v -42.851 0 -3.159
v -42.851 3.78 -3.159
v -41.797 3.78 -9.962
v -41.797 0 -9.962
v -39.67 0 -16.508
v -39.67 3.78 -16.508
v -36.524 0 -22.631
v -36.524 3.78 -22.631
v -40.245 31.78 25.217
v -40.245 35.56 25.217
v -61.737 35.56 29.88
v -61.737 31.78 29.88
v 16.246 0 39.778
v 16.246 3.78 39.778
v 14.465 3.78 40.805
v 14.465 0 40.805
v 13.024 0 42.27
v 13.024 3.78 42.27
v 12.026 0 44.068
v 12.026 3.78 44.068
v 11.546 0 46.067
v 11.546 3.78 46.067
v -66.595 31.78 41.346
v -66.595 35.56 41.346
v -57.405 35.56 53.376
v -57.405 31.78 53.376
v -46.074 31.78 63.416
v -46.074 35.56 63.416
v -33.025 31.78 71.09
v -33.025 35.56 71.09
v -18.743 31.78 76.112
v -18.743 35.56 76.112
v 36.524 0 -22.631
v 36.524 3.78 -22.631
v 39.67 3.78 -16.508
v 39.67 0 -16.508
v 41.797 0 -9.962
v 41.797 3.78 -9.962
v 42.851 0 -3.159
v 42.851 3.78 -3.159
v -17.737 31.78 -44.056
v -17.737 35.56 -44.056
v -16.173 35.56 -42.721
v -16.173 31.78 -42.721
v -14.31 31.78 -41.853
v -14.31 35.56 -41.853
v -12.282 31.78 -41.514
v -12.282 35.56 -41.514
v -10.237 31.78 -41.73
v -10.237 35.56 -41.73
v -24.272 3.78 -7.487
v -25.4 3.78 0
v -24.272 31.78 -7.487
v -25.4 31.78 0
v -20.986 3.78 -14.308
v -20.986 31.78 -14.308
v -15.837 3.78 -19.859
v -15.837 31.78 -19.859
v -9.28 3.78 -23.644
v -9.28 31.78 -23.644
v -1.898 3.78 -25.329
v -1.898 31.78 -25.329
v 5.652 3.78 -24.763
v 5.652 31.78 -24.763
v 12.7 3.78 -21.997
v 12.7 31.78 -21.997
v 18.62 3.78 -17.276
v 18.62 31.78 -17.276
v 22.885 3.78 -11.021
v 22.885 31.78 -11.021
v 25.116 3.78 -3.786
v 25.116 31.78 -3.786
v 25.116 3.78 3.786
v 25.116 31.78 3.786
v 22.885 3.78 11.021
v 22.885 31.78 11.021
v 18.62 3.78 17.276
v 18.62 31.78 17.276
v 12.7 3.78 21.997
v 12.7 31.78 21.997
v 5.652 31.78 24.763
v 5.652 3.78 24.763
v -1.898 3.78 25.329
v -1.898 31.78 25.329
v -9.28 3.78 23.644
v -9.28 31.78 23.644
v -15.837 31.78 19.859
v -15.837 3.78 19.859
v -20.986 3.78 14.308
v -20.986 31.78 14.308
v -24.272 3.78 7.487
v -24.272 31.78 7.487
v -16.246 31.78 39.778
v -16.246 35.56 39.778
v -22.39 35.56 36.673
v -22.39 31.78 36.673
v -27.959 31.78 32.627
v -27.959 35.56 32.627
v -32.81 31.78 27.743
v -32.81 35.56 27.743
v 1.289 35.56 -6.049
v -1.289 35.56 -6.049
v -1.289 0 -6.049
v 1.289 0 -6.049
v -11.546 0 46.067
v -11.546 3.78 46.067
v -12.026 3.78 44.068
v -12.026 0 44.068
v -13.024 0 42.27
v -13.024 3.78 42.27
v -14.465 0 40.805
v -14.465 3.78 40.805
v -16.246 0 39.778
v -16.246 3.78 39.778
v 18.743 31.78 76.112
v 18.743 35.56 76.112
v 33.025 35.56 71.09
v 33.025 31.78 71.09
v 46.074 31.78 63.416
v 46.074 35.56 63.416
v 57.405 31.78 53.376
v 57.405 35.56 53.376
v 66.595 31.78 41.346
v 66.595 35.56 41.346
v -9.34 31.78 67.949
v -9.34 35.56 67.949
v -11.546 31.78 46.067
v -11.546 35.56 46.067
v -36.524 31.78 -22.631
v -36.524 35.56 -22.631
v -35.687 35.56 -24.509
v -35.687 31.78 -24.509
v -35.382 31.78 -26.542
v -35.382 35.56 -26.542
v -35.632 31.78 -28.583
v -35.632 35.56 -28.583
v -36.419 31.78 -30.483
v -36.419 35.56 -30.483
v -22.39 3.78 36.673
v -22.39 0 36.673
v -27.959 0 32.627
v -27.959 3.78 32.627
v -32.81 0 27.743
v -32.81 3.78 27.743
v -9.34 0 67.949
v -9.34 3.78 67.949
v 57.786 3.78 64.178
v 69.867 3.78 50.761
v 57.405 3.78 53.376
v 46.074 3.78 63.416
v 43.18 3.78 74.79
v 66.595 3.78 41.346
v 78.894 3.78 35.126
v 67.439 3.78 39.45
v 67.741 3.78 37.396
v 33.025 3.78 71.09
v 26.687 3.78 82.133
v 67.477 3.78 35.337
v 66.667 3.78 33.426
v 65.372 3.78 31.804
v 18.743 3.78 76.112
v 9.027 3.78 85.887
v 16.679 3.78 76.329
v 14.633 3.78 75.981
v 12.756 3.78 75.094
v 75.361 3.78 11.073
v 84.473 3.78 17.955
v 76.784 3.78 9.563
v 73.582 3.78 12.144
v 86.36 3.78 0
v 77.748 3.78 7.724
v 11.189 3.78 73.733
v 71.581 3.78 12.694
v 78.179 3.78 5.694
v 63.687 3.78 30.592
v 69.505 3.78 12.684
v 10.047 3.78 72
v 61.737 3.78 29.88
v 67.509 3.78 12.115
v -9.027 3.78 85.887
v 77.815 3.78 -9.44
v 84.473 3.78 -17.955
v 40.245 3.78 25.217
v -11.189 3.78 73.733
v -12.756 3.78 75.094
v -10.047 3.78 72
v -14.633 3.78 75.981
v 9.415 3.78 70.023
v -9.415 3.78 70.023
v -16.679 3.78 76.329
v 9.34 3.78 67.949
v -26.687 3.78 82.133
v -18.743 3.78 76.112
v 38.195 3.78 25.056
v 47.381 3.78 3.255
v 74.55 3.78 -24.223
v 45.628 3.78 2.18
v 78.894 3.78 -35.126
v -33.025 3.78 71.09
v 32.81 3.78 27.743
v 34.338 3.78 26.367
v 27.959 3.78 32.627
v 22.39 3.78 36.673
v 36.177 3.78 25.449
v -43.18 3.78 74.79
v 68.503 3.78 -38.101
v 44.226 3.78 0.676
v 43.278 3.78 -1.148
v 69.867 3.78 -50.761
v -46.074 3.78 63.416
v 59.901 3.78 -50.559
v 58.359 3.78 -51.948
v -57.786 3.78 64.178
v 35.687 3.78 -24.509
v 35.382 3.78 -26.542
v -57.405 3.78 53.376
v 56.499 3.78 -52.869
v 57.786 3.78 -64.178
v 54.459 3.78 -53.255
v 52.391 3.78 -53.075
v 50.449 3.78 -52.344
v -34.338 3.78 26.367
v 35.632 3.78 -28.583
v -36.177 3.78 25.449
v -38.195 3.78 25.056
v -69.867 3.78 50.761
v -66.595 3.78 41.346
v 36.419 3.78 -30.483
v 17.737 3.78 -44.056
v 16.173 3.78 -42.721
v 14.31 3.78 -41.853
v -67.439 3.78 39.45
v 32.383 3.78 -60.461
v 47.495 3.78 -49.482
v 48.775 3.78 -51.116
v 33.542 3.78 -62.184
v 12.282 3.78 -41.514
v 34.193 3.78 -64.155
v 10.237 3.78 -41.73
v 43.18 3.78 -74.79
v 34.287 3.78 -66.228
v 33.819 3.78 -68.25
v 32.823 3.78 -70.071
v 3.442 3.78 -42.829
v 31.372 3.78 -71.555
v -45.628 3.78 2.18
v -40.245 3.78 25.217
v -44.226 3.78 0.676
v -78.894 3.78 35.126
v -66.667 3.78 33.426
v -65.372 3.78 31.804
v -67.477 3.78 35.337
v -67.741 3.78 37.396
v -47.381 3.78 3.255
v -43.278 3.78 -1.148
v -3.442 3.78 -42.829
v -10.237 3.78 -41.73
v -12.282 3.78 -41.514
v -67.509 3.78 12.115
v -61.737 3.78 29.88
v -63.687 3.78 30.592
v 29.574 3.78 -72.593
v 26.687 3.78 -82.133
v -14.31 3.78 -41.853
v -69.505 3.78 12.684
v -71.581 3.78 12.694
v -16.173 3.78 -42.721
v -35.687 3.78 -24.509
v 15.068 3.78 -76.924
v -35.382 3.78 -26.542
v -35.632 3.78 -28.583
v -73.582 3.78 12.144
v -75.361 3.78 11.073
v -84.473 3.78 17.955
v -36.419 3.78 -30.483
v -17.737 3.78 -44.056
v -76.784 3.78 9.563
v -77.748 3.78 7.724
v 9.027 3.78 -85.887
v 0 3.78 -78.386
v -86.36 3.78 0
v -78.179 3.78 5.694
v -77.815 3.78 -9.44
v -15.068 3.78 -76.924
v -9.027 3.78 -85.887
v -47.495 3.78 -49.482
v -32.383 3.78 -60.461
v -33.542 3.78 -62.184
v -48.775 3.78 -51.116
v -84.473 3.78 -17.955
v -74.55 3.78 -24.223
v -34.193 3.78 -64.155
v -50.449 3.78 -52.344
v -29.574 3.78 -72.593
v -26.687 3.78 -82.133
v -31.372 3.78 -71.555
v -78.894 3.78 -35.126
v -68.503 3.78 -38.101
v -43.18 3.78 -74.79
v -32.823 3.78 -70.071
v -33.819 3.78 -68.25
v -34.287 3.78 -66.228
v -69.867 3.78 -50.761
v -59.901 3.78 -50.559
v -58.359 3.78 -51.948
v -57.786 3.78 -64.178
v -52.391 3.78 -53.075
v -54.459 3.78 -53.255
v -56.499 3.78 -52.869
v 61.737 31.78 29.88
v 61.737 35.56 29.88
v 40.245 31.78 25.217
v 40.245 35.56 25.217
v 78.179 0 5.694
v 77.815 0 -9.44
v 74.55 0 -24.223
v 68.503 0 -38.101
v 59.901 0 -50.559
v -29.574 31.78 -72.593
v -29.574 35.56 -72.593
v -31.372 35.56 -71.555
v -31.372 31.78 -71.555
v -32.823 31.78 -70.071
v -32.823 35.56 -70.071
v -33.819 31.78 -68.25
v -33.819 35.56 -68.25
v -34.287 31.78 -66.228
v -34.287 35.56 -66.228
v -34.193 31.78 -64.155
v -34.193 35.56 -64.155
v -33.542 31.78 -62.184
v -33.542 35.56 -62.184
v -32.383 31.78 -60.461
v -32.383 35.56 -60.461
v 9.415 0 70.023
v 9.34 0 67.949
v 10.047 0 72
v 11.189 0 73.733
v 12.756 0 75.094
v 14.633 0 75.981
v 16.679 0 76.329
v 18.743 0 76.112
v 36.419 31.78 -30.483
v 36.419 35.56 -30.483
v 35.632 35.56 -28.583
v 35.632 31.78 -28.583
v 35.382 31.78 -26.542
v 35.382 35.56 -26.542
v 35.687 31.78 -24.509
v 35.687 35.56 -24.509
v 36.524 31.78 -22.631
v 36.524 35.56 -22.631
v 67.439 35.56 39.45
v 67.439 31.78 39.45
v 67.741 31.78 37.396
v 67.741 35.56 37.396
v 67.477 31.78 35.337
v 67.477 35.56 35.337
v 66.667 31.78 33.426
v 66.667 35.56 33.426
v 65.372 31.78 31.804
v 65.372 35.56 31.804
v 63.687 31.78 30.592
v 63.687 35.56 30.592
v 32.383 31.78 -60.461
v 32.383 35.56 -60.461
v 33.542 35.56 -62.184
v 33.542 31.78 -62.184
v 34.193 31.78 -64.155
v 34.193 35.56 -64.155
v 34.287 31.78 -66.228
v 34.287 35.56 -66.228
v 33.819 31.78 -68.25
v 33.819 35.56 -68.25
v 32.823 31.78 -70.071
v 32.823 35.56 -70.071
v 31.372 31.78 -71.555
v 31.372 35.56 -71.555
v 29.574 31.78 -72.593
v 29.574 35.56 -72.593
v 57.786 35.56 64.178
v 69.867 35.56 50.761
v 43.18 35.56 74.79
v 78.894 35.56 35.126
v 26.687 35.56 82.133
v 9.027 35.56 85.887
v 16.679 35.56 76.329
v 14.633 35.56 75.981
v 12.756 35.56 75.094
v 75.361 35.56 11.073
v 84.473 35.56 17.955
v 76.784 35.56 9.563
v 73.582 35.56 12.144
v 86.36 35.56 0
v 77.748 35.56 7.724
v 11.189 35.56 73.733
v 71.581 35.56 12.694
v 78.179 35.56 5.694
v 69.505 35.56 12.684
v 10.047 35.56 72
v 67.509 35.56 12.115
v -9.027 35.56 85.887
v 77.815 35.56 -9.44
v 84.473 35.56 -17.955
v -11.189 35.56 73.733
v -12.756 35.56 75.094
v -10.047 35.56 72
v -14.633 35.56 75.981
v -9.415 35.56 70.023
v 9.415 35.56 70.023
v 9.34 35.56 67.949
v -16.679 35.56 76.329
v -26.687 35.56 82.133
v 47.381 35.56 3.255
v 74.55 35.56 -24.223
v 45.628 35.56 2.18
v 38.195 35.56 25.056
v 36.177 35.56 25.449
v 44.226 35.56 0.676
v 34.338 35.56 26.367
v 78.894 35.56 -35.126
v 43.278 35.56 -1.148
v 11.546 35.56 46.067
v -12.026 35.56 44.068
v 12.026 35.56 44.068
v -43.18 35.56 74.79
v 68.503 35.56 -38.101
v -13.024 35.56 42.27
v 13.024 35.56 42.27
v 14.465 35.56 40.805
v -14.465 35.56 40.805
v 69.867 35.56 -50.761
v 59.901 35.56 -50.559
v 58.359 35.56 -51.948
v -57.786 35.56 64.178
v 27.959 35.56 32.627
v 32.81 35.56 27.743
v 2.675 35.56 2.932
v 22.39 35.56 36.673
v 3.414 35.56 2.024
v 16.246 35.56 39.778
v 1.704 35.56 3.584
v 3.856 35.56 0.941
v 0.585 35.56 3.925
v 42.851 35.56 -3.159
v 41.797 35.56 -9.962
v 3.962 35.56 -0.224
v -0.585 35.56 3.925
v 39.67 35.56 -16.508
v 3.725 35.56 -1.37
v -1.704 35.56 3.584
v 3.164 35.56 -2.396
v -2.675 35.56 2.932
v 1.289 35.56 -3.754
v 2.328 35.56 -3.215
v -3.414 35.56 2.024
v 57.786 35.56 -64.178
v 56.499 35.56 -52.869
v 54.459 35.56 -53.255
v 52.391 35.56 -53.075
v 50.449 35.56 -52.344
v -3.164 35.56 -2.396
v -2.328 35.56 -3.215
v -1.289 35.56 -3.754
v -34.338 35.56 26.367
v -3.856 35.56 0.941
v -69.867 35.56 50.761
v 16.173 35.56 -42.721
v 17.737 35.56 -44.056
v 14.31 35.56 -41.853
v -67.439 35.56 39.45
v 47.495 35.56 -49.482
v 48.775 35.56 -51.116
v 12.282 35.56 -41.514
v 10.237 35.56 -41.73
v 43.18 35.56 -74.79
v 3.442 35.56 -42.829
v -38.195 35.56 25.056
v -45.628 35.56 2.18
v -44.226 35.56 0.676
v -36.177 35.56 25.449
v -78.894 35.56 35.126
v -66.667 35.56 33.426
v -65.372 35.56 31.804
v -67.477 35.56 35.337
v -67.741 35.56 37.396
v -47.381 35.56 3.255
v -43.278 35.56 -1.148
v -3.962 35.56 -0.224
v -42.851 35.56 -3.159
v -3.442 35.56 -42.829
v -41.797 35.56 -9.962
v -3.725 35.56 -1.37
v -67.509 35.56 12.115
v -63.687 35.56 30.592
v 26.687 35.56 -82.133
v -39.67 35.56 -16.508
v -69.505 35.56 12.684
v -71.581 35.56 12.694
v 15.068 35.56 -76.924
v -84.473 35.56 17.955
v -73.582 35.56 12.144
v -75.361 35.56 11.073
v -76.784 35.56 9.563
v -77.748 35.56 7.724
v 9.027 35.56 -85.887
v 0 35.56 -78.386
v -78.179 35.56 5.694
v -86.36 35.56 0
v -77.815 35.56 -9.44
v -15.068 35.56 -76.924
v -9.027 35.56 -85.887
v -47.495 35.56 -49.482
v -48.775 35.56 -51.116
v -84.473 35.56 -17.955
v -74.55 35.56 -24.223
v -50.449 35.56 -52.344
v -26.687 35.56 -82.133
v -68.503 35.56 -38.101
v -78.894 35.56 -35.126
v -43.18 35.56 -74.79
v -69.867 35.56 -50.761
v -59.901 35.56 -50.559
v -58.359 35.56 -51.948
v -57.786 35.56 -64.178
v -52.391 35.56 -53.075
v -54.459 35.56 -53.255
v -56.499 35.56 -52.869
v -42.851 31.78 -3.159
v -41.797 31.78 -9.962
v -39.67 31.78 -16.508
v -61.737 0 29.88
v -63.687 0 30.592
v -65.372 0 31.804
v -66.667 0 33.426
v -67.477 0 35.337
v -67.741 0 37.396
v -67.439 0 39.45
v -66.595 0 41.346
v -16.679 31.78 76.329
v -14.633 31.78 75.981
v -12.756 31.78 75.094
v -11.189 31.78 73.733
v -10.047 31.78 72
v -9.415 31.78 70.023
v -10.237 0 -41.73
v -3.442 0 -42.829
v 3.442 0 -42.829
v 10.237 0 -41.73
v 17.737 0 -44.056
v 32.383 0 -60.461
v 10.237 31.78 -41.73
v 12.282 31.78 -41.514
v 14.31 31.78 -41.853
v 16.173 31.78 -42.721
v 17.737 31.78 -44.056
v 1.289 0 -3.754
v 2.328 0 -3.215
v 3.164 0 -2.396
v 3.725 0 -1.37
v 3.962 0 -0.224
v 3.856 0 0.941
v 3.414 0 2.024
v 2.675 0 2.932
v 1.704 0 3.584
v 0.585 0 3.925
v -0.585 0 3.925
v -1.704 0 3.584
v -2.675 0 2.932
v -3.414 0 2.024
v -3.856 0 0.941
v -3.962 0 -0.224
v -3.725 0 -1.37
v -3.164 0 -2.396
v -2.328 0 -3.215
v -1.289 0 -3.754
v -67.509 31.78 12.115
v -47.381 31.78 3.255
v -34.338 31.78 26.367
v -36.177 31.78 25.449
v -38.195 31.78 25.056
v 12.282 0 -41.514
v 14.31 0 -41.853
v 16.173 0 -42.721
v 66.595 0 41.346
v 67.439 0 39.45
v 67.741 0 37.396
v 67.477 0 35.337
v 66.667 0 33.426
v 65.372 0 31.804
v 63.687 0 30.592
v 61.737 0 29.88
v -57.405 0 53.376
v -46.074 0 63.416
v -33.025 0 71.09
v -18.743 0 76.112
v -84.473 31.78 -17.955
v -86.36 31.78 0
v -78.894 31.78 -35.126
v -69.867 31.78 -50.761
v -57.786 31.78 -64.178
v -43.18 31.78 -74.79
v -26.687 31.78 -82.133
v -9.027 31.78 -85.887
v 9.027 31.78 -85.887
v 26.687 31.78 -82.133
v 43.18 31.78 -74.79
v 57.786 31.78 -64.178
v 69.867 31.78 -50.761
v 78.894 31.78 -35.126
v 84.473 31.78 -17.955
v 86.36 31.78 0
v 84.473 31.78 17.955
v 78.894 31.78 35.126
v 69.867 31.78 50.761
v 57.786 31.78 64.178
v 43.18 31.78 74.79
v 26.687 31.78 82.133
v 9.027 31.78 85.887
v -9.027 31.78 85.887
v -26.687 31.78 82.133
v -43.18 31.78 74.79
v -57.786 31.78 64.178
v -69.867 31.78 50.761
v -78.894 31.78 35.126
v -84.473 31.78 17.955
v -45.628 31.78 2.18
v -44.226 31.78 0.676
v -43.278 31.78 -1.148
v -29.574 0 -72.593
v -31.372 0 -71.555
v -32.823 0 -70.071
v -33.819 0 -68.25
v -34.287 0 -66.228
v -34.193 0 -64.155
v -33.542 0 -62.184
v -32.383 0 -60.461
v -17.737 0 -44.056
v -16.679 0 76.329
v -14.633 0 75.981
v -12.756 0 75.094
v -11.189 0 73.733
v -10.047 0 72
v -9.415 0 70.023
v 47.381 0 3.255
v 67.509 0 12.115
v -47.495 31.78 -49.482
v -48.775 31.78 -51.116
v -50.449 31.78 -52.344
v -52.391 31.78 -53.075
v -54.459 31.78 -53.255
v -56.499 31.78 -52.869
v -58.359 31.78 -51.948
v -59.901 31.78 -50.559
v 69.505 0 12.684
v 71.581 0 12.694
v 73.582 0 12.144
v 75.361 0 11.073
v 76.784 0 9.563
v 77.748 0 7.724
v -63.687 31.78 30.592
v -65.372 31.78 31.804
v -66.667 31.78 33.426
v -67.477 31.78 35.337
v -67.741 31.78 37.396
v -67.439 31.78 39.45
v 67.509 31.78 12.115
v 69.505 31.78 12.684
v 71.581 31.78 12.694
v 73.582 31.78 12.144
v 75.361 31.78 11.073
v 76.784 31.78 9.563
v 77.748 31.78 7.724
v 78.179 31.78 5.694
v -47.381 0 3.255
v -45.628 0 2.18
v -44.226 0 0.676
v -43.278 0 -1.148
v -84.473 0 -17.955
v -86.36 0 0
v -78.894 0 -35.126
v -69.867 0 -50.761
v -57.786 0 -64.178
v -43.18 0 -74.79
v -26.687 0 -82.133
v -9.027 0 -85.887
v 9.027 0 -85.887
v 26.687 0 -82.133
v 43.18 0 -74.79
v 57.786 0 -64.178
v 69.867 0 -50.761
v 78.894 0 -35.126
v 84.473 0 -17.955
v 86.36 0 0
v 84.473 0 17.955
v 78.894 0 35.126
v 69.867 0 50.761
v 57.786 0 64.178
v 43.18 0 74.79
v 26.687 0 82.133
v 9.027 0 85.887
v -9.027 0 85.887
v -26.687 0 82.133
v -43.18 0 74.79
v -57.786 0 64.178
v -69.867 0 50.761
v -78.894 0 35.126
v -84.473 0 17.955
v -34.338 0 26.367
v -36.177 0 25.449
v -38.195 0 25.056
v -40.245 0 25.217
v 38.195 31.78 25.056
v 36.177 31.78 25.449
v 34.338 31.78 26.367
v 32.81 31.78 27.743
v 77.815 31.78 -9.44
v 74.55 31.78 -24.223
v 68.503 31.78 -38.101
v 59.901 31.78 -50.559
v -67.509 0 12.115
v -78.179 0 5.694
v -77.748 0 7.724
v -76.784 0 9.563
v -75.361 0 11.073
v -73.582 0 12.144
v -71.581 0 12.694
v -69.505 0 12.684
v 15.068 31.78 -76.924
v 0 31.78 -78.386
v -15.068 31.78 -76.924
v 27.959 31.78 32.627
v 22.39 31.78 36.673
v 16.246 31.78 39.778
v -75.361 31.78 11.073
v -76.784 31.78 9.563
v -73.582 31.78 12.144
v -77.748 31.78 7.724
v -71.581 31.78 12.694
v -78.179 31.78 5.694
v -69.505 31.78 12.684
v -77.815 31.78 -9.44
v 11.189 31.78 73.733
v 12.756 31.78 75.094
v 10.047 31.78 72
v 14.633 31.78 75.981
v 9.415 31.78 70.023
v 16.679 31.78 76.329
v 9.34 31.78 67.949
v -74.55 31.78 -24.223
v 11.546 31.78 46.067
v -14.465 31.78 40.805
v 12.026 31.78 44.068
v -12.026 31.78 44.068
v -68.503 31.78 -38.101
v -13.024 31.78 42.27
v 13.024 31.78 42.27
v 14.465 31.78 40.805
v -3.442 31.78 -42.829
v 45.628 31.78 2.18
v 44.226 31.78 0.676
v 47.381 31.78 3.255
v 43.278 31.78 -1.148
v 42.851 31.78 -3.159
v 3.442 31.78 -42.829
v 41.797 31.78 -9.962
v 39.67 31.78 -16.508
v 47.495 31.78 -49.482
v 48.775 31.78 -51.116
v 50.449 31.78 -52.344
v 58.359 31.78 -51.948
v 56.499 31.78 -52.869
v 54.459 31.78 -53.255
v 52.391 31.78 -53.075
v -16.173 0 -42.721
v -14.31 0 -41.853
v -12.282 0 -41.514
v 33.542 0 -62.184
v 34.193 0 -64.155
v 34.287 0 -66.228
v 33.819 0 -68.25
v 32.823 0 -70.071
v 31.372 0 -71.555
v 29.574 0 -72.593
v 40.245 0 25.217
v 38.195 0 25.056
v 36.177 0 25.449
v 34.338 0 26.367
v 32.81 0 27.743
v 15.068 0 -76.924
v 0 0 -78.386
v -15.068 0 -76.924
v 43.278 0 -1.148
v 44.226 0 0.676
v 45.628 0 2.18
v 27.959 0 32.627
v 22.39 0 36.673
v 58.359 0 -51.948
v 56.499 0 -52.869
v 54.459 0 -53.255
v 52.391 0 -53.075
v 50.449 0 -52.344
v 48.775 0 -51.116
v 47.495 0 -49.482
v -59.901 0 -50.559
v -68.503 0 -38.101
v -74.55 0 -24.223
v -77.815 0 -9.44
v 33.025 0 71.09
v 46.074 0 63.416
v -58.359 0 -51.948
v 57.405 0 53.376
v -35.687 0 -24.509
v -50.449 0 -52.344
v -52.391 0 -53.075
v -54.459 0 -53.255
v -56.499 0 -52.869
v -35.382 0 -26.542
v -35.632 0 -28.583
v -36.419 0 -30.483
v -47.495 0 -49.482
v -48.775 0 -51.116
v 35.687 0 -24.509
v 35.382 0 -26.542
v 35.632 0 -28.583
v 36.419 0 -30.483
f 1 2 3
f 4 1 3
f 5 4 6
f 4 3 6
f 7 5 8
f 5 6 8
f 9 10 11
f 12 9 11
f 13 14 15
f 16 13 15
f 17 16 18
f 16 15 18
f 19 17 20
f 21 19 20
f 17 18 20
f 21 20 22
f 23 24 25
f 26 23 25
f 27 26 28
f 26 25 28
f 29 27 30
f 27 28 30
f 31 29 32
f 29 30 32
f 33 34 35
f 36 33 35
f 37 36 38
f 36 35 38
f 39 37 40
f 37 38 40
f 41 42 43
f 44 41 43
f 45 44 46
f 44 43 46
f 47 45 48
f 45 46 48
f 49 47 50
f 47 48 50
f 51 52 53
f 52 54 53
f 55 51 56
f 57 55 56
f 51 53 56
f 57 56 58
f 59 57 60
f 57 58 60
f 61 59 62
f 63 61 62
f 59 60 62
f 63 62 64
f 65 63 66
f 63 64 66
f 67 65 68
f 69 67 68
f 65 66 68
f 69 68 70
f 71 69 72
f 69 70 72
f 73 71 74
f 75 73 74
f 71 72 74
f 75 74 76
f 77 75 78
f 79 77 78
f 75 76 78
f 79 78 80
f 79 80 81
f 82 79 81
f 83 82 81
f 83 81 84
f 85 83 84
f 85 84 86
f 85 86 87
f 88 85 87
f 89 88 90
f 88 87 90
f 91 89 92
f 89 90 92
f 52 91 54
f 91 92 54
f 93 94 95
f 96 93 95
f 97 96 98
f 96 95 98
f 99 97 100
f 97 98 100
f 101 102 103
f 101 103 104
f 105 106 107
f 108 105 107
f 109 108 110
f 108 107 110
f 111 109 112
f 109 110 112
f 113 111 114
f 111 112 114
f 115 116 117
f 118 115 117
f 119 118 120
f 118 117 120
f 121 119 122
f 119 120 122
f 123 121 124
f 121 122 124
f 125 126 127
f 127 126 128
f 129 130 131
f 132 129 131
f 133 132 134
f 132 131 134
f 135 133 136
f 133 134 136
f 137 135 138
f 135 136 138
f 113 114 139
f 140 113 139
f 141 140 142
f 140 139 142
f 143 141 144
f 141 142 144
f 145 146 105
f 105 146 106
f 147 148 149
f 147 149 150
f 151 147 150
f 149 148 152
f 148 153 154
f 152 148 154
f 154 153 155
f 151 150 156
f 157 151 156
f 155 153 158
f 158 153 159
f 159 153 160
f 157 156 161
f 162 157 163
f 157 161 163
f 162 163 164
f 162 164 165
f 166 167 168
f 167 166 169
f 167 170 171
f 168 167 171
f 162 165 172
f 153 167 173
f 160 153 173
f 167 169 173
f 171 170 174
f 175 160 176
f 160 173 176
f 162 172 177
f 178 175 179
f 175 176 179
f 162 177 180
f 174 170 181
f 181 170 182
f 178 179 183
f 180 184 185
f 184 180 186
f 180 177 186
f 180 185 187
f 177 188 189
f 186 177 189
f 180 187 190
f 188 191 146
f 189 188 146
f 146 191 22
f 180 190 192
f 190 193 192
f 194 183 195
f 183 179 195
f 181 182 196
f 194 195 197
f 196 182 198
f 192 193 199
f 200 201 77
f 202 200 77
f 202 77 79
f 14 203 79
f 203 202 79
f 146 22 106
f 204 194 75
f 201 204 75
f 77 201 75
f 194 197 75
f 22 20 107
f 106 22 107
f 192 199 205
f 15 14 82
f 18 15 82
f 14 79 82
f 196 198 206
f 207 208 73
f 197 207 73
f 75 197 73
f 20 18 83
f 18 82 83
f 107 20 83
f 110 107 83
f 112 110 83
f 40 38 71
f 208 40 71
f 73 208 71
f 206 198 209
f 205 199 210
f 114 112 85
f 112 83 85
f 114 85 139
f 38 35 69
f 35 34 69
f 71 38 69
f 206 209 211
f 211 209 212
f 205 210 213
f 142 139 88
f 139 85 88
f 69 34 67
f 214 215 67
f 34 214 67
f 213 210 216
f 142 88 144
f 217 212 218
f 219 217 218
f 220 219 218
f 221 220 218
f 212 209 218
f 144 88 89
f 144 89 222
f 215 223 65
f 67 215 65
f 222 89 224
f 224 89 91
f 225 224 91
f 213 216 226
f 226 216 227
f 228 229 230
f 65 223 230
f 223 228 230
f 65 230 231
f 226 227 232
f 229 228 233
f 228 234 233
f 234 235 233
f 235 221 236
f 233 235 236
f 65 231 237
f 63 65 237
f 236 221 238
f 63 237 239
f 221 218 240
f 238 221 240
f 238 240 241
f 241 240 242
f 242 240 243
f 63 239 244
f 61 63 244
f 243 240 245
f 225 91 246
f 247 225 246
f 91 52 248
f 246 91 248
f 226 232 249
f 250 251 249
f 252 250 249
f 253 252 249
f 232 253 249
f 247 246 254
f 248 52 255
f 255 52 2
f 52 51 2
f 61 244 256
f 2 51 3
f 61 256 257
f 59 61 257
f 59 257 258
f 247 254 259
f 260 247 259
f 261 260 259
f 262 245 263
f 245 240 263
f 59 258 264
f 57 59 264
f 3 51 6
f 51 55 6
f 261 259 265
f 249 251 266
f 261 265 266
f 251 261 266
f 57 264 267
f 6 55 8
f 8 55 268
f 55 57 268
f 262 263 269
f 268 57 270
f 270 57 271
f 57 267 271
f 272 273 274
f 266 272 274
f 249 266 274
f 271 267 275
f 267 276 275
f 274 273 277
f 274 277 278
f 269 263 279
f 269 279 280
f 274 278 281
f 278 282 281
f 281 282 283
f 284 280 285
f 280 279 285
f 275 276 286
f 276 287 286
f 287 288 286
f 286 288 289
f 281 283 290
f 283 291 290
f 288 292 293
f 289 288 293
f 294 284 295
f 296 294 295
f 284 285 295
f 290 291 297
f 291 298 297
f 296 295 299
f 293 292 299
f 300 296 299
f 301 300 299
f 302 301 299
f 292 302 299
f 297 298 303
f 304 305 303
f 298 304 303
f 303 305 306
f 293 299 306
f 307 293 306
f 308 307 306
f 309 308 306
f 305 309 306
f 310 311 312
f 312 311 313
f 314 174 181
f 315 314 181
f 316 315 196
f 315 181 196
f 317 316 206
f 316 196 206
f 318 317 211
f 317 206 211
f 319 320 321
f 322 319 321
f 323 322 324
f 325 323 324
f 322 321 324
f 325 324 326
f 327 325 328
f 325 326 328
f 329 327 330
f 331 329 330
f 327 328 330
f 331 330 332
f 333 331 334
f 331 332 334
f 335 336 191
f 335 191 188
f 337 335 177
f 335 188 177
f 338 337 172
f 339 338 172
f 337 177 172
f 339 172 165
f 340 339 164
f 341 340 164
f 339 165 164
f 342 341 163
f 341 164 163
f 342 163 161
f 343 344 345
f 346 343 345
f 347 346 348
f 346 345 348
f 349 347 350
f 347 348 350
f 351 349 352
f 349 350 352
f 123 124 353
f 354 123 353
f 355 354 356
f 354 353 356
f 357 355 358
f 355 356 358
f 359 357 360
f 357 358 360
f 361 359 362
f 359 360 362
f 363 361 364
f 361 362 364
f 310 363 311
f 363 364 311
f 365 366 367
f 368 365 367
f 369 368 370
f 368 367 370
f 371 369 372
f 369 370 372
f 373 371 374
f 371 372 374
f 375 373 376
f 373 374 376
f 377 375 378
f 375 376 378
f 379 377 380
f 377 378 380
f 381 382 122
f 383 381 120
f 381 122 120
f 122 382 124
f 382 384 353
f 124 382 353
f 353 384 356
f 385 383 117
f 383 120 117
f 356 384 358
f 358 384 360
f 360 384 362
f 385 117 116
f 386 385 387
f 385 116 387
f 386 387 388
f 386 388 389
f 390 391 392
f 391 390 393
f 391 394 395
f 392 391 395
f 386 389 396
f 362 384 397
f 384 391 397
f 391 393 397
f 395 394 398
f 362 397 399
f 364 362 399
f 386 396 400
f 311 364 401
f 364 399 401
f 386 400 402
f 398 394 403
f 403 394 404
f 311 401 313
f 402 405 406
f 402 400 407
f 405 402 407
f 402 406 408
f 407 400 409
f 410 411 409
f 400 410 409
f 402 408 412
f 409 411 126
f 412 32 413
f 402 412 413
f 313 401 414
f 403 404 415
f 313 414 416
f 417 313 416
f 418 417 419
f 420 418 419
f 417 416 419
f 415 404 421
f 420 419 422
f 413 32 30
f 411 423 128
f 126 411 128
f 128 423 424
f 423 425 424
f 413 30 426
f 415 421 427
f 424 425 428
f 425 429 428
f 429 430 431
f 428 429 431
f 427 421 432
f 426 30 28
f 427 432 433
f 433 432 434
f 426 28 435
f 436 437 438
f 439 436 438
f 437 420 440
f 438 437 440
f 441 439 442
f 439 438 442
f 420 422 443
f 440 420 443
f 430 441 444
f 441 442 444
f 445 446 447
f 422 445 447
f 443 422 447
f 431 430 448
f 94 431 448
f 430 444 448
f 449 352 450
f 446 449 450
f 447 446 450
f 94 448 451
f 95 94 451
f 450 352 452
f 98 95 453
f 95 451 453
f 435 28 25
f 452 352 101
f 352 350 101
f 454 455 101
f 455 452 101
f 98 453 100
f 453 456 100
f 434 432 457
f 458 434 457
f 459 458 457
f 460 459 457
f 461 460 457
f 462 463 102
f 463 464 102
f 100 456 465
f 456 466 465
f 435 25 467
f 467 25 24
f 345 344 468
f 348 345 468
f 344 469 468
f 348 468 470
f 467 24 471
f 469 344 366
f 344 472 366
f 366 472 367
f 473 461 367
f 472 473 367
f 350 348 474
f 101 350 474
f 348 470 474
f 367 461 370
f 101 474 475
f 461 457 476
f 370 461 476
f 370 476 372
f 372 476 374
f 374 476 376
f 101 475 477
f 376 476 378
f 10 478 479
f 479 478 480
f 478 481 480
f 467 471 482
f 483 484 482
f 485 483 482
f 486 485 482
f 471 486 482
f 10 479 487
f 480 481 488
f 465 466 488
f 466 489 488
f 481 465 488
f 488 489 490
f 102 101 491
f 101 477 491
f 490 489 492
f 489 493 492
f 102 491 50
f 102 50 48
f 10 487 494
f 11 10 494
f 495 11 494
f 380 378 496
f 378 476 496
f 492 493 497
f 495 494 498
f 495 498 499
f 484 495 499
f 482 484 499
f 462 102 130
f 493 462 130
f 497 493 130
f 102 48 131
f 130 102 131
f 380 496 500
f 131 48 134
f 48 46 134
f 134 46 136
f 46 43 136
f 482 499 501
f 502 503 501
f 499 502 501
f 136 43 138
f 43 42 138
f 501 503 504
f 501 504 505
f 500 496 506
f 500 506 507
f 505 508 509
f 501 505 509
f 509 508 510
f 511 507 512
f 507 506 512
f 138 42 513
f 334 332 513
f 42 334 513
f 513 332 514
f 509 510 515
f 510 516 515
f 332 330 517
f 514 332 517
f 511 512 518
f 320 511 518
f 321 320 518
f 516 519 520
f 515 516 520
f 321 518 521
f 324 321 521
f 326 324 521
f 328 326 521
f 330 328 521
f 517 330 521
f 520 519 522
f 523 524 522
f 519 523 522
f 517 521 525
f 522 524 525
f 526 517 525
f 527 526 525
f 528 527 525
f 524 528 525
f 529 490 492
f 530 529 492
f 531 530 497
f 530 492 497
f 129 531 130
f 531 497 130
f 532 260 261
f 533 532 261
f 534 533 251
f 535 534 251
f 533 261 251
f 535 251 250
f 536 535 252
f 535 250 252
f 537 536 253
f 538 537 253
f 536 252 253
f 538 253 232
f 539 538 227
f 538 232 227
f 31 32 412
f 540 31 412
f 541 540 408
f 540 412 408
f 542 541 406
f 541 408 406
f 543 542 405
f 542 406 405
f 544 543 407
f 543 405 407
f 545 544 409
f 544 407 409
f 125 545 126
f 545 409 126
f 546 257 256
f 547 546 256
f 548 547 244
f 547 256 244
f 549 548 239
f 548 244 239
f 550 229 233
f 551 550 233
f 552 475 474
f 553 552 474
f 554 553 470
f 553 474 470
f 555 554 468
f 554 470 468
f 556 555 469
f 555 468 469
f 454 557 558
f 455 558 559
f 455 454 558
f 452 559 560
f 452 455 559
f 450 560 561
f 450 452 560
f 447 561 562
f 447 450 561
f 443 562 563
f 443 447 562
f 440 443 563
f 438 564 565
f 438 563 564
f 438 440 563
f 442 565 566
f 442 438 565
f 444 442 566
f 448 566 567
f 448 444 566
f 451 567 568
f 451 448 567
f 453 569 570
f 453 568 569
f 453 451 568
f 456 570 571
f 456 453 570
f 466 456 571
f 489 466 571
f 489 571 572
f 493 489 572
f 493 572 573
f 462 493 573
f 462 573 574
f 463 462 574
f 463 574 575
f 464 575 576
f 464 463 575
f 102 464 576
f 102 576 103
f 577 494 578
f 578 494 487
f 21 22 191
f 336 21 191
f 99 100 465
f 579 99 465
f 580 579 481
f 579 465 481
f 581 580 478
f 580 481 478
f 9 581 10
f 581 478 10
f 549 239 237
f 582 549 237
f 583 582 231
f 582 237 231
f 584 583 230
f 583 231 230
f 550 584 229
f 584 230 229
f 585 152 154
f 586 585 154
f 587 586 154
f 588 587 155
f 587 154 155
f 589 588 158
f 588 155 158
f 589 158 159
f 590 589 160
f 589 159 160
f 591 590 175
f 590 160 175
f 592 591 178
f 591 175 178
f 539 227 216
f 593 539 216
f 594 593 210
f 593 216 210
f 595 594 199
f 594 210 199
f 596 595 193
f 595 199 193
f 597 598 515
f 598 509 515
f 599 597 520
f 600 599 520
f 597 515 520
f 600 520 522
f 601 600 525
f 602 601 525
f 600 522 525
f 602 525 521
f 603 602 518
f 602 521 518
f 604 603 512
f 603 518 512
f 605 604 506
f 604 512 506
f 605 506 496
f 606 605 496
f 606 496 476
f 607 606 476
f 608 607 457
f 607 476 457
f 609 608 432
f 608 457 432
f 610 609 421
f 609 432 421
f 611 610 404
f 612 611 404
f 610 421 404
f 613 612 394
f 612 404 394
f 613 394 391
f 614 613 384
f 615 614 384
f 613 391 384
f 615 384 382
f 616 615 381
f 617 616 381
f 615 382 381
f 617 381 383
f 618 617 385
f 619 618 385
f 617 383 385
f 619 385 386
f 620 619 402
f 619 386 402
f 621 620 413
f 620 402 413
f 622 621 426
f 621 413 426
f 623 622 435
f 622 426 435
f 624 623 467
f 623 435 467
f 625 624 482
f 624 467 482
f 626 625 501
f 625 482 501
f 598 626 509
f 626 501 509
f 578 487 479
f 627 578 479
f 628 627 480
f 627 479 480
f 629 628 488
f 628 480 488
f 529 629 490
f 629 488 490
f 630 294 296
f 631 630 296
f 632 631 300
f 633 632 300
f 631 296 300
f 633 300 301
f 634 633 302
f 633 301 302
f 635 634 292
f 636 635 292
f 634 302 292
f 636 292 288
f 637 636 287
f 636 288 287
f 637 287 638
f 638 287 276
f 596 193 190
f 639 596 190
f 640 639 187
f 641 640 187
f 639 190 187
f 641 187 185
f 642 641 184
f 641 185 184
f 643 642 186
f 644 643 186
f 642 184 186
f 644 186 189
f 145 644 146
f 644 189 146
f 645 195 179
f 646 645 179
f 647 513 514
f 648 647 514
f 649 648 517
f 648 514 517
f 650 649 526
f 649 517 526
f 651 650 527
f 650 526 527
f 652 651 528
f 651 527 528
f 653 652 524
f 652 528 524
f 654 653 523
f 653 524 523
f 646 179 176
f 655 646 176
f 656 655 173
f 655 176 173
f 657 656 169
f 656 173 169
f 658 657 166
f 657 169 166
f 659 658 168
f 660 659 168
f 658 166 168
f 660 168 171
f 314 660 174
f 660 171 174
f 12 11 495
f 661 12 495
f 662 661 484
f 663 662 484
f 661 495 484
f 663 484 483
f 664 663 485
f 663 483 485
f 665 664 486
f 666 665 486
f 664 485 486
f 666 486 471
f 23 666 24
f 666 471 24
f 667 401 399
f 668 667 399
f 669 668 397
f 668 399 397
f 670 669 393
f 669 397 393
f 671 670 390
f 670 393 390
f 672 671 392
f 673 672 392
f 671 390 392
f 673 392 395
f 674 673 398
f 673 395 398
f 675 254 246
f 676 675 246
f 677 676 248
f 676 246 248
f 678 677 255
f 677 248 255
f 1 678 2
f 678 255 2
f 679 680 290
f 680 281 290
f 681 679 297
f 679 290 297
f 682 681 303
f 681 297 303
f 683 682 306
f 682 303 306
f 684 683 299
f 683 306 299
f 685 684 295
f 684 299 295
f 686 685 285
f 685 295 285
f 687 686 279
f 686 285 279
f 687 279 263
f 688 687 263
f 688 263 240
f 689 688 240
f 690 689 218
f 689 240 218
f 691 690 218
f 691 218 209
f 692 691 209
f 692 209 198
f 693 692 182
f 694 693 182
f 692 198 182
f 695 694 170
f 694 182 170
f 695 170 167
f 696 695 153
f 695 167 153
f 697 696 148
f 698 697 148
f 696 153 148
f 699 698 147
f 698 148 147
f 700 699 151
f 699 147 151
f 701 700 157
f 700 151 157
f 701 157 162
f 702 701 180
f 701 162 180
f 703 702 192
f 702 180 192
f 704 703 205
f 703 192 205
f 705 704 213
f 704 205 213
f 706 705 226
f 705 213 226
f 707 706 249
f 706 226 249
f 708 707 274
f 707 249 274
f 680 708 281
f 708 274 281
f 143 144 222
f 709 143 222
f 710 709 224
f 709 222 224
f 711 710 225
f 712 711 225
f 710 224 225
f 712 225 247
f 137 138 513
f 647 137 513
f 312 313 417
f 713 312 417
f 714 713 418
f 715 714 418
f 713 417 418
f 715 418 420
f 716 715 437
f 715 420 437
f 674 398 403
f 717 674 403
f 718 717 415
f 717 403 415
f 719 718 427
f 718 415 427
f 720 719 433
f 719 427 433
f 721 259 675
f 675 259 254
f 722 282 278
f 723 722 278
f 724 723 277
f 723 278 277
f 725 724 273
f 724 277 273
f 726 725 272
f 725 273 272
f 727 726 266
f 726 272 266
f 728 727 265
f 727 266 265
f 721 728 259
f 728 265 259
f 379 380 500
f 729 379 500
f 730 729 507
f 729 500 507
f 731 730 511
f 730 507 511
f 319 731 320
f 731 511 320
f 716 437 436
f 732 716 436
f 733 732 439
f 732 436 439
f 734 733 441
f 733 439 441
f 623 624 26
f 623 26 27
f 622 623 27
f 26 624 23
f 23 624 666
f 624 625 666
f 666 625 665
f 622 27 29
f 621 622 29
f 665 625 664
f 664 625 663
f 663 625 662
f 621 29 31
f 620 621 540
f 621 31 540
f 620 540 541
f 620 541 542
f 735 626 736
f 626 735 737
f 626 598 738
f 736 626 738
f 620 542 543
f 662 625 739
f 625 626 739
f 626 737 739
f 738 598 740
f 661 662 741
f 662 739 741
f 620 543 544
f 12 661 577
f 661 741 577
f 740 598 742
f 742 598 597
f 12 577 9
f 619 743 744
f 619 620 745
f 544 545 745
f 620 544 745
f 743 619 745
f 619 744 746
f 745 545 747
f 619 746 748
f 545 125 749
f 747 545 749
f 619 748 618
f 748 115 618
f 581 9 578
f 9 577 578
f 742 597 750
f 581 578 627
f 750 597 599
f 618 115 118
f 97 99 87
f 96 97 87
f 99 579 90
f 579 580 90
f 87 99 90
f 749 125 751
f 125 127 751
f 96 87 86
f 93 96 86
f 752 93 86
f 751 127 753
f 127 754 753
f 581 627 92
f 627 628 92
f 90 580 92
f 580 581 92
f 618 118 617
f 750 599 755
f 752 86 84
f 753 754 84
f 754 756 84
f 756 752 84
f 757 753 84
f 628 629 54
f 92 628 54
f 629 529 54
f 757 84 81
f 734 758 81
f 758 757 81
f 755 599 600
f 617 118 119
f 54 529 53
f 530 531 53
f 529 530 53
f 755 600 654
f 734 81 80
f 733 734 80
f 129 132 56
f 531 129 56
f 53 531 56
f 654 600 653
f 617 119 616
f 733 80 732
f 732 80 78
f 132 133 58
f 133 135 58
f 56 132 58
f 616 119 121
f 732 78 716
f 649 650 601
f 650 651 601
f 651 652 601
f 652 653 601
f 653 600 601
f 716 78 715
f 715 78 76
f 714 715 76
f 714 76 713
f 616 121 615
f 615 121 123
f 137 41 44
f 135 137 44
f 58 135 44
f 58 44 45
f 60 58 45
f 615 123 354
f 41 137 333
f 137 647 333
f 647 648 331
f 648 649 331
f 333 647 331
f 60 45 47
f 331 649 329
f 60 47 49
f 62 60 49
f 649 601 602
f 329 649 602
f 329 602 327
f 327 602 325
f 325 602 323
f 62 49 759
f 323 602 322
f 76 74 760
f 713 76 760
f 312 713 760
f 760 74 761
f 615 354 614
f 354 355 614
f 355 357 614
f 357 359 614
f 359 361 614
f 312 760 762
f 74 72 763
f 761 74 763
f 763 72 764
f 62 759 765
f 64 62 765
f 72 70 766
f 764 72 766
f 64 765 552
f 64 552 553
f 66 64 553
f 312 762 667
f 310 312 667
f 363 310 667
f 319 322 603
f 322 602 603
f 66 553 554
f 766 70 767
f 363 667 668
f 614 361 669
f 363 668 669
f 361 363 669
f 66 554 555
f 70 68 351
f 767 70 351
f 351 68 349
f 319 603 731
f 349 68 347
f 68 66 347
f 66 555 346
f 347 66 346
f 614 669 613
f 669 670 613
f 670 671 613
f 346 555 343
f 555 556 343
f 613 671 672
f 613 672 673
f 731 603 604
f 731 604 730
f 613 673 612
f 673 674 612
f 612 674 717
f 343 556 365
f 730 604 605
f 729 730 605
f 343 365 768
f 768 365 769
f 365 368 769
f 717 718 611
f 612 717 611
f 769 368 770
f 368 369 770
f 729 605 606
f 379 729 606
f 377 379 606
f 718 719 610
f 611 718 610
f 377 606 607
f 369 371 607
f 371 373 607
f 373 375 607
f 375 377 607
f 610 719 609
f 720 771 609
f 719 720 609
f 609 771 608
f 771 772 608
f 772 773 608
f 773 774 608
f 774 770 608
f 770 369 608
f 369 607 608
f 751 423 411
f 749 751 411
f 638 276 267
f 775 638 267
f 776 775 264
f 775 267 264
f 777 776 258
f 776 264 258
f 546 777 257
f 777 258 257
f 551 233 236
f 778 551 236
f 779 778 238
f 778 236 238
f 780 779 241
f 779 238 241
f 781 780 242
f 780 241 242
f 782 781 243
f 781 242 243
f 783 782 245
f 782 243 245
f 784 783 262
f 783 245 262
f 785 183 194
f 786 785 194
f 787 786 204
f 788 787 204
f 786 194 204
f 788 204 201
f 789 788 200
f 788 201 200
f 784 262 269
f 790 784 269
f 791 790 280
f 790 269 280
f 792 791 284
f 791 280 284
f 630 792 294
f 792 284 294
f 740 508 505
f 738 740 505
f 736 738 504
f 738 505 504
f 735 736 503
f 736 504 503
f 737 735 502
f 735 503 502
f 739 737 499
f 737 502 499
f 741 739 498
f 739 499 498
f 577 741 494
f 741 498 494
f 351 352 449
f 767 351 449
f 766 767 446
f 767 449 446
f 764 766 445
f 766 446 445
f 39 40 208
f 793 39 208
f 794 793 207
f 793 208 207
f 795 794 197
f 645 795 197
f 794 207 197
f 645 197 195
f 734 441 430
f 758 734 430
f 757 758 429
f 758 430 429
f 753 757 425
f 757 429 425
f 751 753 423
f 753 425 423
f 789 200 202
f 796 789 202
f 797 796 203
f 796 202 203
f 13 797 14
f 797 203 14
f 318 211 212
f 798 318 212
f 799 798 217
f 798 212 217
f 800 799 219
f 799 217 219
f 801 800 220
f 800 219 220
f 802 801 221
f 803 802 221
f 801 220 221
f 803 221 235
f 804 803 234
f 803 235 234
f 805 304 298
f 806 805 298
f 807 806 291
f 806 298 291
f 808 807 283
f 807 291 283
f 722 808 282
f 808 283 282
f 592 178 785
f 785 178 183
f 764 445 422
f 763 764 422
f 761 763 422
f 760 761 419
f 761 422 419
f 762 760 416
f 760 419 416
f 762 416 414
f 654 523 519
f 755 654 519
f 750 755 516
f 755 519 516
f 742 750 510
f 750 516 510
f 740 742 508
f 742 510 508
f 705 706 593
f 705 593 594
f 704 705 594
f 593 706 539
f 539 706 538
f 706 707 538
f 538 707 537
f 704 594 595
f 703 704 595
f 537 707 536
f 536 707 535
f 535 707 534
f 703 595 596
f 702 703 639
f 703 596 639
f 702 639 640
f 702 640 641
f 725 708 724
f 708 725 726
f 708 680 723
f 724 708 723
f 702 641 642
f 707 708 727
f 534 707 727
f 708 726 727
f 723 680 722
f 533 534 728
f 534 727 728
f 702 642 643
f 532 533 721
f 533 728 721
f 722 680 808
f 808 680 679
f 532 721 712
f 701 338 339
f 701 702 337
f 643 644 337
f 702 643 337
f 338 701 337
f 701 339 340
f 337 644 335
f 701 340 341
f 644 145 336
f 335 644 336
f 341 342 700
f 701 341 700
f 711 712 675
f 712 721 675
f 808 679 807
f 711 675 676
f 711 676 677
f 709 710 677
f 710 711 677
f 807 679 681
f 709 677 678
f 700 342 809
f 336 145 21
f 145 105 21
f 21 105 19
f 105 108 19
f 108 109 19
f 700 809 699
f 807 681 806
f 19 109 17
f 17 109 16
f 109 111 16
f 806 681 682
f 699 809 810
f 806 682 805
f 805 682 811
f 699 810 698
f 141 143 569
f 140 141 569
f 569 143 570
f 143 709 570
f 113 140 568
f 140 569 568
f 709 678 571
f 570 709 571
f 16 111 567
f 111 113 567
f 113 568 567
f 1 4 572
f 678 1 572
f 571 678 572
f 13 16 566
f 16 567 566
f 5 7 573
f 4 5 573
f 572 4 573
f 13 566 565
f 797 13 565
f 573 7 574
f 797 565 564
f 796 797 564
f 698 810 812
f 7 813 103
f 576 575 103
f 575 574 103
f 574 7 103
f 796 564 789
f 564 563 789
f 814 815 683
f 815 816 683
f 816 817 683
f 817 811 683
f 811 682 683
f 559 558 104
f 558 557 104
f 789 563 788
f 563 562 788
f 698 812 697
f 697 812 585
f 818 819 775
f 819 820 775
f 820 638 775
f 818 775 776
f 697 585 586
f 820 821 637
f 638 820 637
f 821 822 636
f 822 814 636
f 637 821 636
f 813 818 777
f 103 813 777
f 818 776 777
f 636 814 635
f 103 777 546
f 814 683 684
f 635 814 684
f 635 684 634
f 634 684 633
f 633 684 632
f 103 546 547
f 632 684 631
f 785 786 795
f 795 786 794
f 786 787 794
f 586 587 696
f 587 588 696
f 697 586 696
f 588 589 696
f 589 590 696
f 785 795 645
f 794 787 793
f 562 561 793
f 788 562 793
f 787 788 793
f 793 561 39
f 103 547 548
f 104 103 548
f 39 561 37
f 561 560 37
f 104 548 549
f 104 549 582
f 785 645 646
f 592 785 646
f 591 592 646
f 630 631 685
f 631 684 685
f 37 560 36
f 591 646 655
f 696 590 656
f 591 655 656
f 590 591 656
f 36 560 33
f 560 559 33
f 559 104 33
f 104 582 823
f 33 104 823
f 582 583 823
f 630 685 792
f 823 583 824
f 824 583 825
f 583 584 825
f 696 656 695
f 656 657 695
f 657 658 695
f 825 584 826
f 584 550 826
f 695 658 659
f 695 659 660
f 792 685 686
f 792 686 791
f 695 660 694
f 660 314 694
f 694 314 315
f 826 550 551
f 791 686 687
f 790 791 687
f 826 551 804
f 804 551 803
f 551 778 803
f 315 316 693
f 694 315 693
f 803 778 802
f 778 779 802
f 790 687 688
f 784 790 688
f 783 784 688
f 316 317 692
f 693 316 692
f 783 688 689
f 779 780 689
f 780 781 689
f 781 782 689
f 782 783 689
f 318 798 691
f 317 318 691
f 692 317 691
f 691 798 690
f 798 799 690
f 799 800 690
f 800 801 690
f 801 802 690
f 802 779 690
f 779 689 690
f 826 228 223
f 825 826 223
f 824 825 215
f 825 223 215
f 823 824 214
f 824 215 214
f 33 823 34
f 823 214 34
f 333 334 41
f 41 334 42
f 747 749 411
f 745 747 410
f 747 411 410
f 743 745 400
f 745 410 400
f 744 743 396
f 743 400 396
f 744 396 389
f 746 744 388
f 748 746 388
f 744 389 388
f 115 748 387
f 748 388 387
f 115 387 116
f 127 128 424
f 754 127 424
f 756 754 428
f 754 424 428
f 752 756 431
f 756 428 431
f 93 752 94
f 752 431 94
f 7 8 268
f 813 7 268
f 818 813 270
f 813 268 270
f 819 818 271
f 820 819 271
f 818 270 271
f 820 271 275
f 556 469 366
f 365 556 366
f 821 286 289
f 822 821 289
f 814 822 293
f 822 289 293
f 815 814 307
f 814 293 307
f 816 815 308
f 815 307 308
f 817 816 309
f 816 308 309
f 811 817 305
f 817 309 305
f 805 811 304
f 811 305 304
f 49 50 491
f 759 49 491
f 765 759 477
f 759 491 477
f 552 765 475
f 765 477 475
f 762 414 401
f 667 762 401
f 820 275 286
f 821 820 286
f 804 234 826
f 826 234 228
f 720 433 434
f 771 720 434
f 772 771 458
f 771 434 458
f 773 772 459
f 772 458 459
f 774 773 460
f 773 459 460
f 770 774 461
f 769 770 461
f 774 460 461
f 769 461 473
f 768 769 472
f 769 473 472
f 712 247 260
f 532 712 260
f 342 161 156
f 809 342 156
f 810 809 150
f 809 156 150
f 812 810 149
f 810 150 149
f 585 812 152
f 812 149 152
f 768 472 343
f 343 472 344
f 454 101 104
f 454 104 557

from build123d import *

# Parameters (mm, degrees)
CUT_EXTRUDE1_DEPTH = 128.2030377
CIRPATTERN1_COUNT  = 5
CUT_EXTRUDE2_DEPTH = 128.2030377


with BuildPart() as part:
    # Sketch1 → Revolve1 (revolve)
    with BuildSketch(Plane.XY, mode=Mode.PRIVATE) as revolve1_sk:
        Polygon((0, 0), (86.36, 0), (86.36, 3.78), (25.4, 3.78), (25.4, 31.78), (86.36, 31.78), (86.36, 35.56), (0, 35.56), align=None)
    revolve(revolve1_sk.sketch.rotate(Axis((0, 35.56, 0), (0, -1, 0)), 180), axis=Axis((0, 35.56, 0), (0, -1, 0)))

    # Sketch2 → Cut-Extrude1 (cut, through all)
    with BuildSketch(Plane(origin=(0, 35.56, 0), x_dir=(1, 0, 0), z_dir=(0, 1, 0))):
        with BuildLine():
            Line((-32.38324098, 60.461396247), (-17.736798391, 44.055966634))
            ThreePointArc((-17.736798391, 44.055966634), (-14.309566496, 41.852699526), (-10.237061566, 41.730192332))
            ThreePointArc((-10.237061566, 41.730192332), (0, 42.967503786), (10.237061566, 41.730192332))
            ThreePointArc((10.237061566, 41.730192332), (14.309566496, 41.852699526), (17.736798391, 44.055966634))
            Line((17.736798391, 44.055966634), (32.38324098, 60.461396247))
            ThreePointArc((32.38324098, 60.461396247), (34.12253228, 67.255277706), (29.573893077, 72.593052609))
            ThreePointArc((29.573893077, 72.593052609), (0, 78.386009204), (-29.573893077, 72.593052609))
            ThreePointArc((-29.573893077, 72.593052609), (-34.12253228, 67.255277706), (-32.38324098, 60.461396247))
        make_face()
    cut_extrude1 = extrude(amount=-CUT_EXTRUDE1_DEPTH, mode=Mode.SUBTRACT)

    # CirPattern1: Cut-Extrude1 ×5 about axis
    cirpattern1_axis = Axis((0, 0, 0), (0, 1, 0))
    for i in range(1, CIRPATTERN1_COUNT):
        add(cut_extrude1.rotate(cirpattern1_axis, i * 360 / CIRPATTERN1_COUNT), mode=Mode.SUBTRACT)

    # Sketch3 → Cut-Extrude2 (cut, through all)
    with BuildSketch(Plane(origin=(0, 35.56, 0), x_dir=(1, 0, 0), z_dir=(0, 1, 0))):
        with BuildLine():
            Line((-1.2891518, 3.753540222), (-1.2891518, 6.049382139))
            Line((-1.2891518, 6.049382139), (1.2891518, 6.049382139))
            Line((1.2891518, 6.049382139), (1.2891518, 3.753540222))
            ThreePointArc((1.2891518, 3.753540222), (0, -3.96875), (-1.2891518, 3.753540222))
        make_face()
    extrude(amount=-CUT_EXTRUDE2_DEPTH, mode=Mode.SUBTRACT)


solid = part.part
